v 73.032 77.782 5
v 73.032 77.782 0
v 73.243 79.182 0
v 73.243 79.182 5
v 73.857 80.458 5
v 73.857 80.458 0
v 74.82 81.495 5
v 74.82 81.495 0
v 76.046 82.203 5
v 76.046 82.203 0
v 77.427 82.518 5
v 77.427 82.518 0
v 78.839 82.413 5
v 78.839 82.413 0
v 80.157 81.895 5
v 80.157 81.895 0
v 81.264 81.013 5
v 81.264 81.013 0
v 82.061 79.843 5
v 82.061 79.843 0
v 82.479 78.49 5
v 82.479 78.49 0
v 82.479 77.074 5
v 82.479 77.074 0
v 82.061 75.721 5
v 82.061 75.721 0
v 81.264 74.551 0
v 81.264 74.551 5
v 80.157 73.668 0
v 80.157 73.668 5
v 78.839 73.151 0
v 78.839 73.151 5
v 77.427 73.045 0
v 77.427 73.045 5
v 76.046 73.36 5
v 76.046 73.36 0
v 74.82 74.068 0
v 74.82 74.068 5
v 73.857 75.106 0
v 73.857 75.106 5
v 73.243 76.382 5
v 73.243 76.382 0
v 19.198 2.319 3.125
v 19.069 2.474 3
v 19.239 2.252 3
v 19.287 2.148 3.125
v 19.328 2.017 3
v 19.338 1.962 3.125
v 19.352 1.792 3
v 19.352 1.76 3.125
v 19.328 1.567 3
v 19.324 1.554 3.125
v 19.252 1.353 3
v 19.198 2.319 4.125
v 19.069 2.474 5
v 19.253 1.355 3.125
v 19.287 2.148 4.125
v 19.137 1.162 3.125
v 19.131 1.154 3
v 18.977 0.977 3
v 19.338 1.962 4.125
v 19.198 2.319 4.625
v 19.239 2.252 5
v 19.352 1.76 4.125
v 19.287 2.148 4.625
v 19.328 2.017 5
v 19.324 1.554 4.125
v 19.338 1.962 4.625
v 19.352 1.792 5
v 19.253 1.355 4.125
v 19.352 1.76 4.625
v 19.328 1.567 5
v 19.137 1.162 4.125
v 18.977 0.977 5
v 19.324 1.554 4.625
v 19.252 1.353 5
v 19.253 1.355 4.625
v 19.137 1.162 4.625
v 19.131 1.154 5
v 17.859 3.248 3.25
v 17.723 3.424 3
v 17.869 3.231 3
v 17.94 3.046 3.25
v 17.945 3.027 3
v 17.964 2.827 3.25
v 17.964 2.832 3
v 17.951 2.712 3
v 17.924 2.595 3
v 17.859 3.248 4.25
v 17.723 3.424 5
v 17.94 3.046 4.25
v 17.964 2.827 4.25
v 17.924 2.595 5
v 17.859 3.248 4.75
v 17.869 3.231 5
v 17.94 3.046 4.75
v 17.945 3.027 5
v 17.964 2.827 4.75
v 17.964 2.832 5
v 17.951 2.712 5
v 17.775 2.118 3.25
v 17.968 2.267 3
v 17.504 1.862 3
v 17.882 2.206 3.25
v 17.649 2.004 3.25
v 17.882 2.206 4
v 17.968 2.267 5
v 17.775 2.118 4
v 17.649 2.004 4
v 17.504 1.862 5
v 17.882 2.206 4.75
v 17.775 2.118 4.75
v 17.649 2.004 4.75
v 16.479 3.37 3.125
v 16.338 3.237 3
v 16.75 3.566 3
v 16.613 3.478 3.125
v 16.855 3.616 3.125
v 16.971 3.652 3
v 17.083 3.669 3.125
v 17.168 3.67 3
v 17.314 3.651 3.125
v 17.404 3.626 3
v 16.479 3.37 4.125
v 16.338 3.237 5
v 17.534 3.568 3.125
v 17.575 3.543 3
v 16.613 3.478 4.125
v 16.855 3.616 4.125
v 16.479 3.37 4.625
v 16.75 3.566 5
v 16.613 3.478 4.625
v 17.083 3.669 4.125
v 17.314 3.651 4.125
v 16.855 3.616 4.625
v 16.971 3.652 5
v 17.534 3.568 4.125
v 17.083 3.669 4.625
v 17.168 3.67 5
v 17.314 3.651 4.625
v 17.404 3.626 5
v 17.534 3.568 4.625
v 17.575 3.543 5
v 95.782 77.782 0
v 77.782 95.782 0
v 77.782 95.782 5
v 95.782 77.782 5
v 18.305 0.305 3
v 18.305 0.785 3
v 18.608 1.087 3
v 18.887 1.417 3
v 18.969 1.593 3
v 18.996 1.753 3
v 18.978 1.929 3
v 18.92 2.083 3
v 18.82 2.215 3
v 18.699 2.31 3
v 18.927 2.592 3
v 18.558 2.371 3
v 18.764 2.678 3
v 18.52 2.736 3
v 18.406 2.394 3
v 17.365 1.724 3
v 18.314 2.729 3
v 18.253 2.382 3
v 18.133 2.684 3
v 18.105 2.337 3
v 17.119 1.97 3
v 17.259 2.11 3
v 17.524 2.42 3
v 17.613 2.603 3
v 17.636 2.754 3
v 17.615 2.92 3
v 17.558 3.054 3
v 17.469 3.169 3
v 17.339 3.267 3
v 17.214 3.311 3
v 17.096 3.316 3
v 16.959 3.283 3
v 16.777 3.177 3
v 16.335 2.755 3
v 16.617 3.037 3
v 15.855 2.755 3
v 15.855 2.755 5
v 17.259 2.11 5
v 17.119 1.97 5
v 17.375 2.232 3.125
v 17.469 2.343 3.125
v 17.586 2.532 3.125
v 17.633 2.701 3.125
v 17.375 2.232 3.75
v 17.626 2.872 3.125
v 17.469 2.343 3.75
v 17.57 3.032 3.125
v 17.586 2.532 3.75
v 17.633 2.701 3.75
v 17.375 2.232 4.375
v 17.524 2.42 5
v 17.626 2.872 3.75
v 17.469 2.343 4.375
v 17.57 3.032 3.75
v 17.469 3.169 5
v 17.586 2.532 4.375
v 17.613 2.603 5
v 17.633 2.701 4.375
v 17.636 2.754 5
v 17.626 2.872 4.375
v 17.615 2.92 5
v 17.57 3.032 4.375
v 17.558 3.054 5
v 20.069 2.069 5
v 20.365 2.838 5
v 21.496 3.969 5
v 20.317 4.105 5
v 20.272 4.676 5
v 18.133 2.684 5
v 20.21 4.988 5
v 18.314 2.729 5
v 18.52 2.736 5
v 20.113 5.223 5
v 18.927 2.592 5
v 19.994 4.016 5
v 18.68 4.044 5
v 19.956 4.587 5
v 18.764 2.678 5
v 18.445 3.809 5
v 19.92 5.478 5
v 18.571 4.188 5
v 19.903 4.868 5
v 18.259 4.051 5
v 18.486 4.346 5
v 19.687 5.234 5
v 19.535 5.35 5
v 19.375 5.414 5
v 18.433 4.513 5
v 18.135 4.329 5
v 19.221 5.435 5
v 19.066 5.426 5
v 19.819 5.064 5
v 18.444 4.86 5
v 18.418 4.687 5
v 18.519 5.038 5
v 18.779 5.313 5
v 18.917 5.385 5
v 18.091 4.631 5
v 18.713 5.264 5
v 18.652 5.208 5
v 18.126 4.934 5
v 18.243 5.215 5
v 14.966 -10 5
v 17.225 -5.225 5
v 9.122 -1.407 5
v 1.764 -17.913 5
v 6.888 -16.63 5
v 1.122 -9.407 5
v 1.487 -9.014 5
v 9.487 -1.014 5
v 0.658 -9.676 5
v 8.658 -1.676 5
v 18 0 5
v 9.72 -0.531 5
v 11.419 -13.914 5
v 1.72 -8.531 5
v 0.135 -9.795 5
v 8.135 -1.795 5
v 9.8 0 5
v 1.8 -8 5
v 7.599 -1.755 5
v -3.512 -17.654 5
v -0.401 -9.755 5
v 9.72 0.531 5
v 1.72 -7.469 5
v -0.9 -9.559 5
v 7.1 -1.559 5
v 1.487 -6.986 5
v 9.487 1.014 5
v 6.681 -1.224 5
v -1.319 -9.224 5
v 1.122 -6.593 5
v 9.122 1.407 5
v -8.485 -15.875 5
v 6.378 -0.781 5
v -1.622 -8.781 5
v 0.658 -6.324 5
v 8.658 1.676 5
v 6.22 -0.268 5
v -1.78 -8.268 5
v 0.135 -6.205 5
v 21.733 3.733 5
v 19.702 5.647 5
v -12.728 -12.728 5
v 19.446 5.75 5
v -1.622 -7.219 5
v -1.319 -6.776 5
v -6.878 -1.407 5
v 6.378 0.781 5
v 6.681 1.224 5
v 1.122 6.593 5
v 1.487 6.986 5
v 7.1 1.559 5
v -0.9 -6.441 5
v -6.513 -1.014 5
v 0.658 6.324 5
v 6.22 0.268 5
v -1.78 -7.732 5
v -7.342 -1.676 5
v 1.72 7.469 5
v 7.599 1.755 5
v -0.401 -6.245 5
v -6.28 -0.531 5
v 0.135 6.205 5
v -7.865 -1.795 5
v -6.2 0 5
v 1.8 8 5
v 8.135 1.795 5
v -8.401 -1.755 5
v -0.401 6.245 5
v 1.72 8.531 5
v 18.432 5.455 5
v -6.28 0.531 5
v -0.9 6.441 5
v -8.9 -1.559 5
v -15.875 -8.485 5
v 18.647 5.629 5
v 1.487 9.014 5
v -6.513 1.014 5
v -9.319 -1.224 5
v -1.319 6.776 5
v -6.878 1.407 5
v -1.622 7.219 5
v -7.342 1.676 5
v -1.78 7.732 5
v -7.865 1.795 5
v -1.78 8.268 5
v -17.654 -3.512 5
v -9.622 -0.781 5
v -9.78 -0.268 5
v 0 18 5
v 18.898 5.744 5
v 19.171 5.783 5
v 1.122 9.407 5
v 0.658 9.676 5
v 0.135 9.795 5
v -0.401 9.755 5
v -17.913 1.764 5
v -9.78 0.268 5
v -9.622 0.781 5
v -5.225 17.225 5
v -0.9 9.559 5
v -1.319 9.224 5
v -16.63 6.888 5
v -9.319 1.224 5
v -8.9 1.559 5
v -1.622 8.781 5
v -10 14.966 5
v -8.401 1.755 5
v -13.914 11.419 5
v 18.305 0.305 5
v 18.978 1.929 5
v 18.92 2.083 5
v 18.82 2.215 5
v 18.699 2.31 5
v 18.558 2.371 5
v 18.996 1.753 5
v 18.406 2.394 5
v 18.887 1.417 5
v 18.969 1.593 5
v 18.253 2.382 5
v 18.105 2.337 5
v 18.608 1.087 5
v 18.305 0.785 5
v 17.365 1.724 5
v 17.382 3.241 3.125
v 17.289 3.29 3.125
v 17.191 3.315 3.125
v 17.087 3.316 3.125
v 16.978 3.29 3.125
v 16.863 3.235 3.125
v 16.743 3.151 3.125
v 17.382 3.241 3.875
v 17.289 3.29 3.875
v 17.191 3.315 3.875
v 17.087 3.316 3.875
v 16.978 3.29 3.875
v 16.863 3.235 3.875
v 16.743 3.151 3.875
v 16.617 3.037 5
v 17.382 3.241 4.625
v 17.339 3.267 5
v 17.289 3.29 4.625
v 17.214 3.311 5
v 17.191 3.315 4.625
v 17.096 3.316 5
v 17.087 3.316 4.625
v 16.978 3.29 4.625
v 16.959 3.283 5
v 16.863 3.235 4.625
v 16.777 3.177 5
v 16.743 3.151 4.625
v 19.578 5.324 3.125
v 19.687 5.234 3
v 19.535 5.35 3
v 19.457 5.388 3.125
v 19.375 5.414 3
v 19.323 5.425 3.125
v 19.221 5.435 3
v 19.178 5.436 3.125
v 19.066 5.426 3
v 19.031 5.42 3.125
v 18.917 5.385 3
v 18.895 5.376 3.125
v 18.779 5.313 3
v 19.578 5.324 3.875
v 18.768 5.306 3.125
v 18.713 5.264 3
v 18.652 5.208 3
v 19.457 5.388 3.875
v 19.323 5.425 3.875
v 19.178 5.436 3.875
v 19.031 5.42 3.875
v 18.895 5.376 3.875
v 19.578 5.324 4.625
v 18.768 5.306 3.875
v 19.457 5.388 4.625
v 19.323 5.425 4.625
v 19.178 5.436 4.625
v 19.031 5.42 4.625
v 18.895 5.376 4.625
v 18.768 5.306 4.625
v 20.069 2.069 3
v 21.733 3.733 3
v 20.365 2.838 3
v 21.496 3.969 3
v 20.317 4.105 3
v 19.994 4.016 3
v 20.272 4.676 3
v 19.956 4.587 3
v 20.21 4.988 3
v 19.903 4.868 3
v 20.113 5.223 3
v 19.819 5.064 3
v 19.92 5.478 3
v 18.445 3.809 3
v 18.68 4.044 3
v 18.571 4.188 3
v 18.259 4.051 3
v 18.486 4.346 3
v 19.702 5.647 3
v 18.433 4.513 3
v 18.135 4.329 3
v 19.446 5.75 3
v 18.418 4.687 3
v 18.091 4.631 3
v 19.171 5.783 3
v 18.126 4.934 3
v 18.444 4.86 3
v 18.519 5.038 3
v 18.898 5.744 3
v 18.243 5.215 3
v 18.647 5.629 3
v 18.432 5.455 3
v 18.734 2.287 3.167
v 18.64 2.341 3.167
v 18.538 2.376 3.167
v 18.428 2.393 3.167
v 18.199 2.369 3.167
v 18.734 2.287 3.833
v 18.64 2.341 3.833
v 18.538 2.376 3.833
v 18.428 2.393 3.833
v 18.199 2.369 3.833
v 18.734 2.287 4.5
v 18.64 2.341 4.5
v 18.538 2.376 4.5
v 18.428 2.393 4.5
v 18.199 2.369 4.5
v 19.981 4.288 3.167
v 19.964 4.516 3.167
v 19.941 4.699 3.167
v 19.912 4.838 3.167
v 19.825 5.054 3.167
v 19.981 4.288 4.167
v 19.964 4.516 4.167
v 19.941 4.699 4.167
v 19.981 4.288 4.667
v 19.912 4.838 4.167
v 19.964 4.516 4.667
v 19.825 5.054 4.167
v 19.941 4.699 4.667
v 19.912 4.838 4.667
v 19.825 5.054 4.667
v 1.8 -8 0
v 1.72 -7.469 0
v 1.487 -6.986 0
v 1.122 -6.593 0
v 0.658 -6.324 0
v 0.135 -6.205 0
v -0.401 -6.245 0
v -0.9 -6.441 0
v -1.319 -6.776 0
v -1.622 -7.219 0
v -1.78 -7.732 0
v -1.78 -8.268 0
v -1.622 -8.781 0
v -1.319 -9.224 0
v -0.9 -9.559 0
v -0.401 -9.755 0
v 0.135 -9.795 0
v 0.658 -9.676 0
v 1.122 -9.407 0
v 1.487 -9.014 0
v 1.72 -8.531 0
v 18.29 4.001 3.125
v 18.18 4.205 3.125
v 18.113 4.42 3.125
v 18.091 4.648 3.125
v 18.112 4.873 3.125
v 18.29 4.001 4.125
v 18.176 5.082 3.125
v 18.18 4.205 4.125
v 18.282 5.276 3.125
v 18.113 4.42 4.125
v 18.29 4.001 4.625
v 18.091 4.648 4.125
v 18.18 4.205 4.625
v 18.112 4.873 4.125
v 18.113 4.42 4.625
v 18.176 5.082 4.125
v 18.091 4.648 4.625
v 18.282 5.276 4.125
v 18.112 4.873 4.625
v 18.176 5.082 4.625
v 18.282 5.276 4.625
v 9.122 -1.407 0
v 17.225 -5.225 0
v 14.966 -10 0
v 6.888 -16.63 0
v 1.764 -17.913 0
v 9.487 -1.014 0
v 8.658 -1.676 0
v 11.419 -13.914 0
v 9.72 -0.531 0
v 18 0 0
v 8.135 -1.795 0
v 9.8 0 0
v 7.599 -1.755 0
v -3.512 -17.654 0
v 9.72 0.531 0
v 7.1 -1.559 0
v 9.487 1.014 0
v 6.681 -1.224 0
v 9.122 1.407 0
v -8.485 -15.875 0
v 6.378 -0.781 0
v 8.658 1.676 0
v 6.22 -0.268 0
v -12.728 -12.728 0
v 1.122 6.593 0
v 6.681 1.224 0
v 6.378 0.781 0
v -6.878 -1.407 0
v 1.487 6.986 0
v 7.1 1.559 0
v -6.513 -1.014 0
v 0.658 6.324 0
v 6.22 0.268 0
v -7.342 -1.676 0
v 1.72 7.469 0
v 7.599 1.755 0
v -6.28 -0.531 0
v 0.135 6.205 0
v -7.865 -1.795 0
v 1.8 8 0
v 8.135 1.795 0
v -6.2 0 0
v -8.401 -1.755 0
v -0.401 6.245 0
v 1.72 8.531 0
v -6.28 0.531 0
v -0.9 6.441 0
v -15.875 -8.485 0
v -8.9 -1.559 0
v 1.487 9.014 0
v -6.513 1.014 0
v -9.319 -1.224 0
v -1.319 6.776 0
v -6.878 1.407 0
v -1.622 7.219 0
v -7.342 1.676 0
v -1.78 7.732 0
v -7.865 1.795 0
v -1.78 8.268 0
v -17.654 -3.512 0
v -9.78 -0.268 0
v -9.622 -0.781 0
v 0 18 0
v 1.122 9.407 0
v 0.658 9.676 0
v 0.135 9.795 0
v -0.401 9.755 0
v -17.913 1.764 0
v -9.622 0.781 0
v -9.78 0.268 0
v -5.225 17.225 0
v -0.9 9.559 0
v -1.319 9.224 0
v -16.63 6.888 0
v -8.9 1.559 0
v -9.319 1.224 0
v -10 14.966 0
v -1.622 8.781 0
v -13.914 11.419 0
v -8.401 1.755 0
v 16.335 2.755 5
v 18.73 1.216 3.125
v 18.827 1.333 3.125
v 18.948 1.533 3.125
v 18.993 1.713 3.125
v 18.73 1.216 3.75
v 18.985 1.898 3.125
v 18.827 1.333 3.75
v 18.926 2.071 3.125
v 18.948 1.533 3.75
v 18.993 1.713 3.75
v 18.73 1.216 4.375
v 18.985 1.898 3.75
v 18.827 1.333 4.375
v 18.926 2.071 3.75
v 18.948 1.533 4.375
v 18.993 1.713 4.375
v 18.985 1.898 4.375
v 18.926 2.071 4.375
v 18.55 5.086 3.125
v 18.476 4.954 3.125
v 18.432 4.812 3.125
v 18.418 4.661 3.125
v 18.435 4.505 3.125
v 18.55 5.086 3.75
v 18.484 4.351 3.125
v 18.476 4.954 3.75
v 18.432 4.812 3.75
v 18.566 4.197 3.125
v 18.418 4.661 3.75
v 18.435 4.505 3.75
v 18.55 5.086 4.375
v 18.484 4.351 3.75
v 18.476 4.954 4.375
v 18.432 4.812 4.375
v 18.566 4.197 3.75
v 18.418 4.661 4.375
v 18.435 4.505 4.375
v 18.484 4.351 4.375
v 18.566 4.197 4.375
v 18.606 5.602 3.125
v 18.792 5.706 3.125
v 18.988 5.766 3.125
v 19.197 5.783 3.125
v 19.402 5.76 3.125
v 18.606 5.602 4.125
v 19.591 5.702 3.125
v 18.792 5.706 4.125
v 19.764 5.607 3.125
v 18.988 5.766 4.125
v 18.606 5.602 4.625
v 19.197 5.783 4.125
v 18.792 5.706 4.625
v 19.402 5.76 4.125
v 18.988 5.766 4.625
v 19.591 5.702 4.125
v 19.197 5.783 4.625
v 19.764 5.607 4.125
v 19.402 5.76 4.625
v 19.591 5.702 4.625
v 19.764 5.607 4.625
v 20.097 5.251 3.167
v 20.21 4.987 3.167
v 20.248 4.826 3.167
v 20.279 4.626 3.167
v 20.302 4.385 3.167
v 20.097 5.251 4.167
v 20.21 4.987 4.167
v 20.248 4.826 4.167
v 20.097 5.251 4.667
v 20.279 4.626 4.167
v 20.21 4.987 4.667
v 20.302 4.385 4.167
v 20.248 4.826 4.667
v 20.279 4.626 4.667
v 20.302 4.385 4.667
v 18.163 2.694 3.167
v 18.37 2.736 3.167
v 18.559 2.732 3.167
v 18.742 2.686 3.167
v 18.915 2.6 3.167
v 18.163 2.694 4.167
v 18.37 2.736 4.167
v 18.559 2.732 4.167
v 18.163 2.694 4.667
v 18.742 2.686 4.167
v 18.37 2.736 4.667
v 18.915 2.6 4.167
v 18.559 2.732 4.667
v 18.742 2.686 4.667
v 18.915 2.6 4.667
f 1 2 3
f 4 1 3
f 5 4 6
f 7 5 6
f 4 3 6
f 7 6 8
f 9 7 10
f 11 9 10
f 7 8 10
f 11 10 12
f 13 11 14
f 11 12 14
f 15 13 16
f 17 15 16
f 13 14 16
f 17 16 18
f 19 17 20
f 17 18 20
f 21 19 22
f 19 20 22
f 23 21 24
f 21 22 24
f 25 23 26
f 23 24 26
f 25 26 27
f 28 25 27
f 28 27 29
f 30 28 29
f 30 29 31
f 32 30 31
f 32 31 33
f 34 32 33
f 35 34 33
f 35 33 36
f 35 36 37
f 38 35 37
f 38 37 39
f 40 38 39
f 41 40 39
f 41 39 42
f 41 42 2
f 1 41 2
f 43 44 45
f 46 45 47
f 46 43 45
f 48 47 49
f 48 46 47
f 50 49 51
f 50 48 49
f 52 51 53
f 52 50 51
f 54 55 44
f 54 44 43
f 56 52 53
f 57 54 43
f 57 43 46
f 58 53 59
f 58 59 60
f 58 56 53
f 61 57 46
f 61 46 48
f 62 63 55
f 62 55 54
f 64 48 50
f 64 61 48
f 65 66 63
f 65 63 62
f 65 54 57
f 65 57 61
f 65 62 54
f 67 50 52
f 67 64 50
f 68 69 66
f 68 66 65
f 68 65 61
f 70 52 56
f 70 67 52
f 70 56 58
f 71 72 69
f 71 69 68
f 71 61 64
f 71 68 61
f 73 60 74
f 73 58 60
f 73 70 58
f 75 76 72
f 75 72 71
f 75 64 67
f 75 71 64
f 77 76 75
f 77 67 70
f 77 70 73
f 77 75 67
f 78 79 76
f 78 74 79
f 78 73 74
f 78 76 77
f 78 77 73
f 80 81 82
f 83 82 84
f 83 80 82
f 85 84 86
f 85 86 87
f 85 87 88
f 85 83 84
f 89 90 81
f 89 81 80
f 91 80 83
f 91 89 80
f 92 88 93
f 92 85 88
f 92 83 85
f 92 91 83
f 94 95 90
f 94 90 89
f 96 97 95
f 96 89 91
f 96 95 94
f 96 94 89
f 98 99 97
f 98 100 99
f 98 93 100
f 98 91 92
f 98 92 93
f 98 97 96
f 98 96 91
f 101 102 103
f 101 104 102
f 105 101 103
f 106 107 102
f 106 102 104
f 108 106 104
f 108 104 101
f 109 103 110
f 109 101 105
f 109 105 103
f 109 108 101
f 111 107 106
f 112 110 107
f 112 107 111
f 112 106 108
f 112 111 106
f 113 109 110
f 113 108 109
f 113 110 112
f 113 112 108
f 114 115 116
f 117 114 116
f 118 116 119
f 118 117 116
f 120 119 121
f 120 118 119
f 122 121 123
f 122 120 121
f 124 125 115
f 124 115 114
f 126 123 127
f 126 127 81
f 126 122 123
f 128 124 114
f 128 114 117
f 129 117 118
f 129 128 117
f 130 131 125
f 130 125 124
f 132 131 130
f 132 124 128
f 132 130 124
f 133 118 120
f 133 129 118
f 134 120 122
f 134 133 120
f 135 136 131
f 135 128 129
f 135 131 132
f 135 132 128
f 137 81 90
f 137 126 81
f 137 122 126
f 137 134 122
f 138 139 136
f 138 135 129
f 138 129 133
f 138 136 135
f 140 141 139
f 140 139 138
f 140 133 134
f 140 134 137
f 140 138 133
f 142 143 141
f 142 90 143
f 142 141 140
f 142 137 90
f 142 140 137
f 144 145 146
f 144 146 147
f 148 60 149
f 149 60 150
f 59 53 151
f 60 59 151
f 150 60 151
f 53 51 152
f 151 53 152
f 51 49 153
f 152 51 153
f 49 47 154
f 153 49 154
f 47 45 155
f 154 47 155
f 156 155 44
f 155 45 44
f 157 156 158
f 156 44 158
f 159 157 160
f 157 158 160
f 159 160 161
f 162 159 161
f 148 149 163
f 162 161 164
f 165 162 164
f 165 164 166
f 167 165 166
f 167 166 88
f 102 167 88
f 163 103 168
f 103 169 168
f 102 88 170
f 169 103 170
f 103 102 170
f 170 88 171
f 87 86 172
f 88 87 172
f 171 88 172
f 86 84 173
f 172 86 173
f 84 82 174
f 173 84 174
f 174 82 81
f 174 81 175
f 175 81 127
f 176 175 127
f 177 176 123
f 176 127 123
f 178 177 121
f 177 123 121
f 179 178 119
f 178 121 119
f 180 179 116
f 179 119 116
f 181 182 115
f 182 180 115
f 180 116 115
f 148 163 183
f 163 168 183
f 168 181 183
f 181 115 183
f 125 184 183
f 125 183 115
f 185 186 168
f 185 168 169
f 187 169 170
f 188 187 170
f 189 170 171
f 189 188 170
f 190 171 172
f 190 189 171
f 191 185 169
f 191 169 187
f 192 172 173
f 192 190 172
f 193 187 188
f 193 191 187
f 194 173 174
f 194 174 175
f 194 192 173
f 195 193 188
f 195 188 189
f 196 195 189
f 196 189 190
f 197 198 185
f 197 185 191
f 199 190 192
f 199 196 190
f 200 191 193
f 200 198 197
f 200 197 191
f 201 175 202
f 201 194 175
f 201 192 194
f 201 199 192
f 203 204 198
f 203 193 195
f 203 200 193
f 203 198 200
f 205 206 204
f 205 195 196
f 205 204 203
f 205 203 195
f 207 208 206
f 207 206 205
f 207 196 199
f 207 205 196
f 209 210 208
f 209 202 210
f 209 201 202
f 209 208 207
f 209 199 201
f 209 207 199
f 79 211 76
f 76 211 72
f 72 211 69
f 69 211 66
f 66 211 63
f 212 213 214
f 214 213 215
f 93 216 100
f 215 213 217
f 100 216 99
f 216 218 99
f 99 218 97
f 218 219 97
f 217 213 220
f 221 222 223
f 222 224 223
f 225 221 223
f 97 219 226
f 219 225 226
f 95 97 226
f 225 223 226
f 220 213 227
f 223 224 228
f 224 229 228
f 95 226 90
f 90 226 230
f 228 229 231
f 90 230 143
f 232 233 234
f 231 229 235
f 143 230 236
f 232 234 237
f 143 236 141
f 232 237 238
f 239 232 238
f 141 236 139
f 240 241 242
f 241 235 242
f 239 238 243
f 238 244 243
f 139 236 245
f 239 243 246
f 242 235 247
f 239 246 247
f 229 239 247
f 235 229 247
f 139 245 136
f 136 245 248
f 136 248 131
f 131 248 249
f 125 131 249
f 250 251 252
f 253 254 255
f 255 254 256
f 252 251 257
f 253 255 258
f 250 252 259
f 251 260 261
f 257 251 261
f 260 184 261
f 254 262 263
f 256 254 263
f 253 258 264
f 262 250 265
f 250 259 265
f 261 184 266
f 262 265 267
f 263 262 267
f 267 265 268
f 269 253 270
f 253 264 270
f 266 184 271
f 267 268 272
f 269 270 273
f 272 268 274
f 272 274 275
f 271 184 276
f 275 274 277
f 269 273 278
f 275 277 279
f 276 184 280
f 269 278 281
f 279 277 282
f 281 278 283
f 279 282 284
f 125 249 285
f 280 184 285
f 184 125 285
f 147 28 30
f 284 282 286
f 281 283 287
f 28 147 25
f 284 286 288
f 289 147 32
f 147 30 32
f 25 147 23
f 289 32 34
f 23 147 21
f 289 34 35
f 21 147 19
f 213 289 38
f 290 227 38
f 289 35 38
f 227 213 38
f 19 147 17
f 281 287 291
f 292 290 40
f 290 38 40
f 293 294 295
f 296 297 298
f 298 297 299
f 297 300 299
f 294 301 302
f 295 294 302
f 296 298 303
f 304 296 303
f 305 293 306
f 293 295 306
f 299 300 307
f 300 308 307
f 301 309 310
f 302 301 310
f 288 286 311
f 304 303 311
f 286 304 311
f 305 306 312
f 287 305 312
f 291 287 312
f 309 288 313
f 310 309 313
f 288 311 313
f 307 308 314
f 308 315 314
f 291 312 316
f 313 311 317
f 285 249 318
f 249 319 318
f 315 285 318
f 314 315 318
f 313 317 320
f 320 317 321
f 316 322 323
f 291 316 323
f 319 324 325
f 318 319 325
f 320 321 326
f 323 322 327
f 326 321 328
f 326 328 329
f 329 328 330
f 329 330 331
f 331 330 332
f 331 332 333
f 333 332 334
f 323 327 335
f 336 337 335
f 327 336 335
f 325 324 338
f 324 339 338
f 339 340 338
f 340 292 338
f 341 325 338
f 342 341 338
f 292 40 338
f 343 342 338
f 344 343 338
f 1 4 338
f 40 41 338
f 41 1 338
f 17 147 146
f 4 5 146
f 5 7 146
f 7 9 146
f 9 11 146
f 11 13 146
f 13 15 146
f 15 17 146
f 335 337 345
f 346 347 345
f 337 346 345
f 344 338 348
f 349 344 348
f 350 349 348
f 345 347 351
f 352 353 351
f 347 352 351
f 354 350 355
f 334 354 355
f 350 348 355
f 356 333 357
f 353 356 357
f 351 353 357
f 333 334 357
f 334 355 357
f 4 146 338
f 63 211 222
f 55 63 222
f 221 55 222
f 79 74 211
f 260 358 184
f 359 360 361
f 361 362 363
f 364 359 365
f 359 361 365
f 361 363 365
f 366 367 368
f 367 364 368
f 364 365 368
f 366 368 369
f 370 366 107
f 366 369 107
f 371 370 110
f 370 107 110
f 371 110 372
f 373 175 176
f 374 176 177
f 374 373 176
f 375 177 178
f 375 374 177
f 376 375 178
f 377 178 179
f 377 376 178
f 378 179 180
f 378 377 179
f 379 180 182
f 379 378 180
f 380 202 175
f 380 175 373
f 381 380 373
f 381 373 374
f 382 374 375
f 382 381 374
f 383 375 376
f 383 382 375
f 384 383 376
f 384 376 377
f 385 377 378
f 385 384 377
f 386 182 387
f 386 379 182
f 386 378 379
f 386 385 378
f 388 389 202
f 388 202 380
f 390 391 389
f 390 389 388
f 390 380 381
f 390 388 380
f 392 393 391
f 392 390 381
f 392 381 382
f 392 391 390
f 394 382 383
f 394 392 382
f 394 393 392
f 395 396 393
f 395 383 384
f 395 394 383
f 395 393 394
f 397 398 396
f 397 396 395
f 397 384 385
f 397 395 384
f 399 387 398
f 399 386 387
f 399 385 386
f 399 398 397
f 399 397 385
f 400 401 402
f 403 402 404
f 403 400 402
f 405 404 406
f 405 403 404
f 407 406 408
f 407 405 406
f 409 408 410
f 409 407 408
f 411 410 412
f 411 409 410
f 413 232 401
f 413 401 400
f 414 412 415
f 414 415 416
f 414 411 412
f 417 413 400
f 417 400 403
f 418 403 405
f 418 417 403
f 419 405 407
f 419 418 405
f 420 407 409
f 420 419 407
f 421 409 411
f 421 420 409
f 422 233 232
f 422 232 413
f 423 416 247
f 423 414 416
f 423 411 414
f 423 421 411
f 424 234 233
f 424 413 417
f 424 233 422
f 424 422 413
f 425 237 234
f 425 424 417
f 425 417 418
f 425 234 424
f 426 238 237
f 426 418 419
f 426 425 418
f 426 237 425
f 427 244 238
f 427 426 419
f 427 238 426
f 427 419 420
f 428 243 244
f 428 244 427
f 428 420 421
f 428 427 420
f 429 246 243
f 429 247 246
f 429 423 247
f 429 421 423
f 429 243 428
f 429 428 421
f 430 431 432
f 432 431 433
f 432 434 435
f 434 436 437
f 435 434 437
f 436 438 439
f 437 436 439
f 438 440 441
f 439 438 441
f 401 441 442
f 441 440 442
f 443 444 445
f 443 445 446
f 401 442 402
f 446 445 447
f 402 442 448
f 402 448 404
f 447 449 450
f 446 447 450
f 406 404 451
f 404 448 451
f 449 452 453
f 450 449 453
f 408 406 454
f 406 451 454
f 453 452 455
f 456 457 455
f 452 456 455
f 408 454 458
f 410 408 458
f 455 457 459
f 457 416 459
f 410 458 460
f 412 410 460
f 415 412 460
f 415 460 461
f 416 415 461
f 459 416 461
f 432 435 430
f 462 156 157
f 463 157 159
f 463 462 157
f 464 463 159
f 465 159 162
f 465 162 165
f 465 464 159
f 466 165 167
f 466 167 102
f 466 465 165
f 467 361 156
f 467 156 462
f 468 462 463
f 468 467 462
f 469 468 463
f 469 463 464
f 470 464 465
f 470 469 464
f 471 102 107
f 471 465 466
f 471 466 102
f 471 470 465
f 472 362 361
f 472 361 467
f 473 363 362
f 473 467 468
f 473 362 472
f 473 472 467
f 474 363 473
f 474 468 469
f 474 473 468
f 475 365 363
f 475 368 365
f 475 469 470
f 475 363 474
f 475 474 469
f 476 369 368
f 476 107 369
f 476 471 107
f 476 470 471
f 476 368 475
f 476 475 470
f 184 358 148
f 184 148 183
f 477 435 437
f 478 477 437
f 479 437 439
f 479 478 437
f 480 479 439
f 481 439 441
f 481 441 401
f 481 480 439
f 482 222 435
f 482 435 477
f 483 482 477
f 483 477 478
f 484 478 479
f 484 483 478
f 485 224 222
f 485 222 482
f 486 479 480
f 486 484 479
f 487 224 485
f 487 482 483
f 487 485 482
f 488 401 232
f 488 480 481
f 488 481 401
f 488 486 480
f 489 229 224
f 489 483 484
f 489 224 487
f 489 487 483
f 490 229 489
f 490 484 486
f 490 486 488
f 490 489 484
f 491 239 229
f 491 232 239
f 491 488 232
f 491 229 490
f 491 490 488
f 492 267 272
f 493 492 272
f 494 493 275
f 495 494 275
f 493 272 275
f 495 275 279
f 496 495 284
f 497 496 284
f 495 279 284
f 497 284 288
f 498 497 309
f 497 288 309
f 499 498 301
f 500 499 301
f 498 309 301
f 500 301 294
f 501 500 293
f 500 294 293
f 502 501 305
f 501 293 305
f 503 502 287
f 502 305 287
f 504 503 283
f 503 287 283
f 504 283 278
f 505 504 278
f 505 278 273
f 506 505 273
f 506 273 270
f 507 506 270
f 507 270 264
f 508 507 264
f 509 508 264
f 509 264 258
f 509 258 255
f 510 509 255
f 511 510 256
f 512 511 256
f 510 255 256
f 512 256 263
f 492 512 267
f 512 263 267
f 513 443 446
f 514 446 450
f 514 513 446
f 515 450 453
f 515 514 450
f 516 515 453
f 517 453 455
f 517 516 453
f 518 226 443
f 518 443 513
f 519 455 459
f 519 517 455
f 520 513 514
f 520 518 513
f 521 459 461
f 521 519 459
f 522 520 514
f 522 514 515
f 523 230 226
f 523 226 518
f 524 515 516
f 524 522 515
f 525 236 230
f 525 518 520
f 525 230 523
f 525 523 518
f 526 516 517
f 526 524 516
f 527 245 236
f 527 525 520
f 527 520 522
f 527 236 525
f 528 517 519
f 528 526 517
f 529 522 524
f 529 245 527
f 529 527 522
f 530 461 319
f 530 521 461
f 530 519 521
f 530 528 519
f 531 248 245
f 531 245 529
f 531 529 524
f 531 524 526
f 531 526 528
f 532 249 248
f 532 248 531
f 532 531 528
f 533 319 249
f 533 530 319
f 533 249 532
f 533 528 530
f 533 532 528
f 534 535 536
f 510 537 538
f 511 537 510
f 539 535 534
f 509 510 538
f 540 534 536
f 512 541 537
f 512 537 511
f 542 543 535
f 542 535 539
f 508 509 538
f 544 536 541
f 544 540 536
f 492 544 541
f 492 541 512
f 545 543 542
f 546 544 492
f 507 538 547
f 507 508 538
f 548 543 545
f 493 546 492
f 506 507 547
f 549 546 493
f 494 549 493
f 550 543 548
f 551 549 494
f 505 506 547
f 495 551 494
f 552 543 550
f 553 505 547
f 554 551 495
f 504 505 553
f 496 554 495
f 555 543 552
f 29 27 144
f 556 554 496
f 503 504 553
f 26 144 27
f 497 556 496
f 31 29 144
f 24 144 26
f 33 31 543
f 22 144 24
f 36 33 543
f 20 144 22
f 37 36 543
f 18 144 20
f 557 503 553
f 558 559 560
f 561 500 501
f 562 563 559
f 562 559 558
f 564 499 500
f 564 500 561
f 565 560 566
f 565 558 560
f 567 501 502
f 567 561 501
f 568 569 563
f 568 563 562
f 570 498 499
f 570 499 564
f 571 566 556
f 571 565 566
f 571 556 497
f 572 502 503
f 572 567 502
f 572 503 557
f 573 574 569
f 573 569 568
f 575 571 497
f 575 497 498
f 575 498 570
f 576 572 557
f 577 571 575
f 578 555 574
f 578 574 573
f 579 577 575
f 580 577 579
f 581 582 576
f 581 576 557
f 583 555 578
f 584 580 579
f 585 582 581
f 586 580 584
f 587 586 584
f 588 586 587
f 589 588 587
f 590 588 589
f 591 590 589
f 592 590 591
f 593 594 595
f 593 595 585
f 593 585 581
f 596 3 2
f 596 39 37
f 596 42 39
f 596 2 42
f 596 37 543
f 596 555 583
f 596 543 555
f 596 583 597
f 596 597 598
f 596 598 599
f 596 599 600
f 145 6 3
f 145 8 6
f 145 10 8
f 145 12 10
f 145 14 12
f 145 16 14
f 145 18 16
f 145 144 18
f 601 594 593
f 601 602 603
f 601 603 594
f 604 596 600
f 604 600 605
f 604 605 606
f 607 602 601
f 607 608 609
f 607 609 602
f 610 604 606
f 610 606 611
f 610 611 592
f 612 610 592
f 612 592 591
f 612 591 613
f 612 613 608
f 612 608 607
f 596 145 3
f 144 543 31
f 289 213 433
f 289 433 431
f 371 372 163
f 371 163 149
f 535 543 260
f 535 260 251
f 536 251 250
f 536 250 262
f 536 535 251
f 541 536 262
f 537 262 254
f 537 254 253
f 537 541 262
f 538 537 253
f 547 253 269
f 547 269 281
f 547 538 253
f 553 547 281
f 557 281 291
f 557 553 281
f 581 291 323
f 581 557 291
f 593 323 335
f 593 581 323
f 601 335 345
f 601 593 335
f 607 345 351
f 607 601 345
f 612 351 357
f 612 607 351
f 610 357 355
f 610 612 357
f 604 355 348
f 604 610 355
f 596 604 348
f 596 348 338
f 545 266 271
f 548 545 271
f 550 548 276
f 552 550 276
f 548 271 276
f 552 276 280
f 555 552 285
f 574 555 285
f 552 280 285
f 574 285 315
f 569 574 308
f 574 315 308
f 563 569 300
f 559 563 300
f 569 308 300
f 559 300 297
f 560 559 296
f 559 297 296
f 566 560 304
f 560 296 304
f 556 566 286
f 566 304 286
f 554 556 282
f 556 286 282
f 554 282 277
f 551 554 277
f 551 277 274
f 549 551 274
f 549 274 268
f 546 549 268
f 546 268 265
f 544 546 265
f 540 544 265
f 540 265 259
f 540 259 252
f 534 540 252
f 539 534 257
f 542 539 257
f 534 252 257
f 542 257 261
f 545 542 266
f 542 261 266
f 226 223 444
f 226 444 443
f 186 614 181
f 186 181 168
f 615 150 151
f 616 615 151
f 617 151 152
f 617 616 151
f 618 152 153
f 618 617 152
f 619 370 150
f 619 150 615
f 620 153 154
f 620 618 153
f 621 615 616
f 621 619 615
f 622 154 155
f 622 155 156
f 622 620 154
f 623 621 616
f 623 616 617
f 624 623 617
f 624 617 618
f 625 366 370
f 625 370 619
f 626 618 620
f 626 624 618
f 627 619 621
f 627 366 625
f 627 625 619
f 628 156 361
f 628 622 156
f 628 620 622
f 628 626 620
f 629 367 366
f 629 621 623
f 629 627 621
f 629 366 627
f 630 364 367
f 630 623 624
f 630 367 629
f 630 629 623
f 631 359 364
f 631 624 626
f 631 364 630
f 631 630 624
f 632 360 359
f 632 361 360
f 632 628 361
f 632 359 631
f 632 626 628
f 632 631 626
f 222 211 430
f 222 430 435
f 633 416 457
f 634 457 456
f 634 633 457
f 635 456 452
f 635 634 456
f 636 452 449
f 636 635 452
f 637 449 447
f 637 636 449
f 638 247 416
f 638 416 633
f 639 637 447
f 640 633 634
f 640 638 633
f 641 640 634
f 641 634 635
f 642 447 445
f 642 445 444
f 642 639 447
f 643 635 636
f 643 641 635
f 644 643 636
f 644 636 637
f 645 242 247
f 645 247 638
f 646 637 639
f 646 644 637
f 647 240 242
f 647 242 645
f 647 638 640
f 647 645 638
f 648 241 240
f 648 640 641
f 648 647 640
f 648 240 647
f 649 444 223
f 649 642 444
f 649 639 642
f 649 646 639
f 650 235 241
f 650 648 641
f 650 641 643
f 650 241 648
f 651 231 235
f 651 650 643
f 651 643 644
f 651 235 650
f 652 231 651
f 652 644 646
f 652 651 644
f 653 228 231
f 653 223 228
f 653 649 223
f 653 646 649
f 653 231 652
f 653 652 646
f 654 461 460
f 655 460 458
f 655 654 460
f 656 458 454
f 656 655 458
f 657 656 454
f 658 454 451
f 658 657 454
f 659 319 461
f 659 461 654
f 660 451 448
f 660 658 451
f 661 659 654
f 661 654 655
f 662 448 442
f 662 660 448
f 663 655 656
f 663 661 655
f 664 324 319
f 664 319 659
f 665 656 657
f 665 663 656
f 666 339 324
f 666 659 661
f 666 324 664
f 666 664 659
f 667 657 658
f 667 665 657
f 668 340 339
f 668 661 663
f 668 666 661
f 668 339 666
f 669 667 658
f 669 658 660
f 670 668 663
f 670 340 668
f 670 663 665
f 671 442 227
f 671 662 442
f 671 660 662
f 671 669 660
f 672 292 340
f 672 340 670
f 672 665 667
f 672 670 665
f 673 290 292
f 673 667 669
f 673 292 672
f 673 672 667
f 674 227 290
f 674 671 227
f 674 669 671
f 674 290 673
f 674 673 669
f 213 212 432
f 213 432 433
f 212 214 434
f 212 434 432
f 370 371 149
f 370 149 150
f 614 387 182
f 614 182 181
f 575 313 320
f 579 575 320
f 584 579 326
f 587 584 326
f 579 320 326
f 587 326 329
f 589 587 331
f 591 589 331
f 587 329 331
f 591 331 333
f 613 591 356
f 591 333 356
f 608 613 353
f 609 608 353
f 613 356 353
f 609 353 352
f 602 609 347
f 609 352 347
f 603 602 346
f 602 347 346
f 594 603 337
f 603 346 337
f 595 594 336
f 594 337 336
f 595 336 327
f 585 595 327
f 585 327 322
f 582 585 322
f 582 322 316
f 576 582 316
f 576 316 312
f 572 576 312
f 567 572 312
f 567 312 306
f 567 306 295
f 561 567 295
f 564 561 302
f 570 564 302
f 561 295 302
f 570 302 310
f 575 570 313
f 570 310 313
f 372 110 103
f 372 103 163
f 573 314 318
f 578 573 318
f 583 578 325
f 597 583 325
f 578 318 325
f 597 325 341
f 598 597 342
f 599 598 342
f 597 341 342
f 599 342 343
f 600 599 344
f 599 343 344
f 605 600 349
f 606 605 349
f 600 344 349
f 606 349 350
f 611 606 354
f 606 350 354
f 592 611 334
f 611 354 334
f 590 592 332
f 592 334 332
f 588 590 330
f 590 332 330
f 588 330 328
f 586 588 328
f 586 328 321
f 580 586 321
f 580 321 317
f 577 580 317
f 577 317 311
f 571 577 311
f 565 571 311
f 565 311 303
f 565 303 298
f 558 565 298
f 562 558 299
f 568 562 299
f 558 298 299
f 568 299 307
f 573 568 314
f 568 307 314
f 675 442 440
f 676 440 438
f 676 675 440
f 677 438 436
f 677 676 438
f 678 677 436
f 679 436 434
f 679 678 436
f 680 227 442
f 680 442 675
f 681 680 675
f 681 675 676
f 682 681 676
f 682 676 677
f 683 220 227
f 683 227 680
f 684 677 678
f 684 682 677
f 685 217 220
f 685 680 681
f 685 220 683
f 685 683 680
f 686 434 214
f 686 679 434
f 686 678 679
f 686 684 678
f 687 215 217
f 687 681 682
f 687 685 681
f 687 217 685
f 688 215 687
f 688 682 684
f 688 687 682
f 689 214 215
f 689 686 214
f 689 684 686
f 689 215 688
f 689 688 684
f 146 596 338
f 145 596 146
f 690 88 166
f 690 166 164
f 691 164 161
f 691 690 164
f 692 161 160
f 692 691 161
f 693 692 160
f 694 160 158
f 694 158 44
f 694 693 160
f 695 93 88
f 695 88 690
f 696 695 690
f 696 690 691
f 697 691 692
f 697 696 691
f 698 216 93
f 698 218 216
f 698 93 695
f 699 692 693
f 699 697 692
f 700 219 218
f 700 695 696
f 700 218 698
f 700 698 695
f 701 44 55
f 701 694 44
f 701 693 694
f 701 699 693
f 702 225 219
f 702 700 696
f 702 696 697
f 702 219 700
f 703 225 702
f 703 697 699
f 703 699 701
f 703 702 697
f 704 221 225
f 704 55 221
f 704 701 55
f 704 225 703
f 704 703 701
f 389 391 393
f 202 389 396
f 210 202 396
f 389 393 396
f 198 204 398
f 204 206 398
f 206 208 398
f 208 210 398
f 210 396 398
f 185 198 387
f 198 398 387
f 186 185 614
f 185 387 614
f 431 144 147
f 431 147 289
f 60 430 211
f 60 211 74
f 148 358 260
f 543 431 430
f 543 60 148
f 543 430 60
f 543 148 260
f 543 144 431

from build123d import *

# Parameters (mm, degrees)
EXTRUDE_1_DEPTH     = 5
SKETCH_3_R          = 1.8
CUT_EXTRUDE_1_DEPTH = 5
SKETCH_17_R         = 4.75
CUT_EXTRUDE_3_DEPTH = 10
CUT_EXTRUDE_4_DEPTH = 2


with BuildPart() as part:
    # ｽｹｯﾁ2 → ﾎﾞｽ - 押し出し1 (new body)
    with BuildSketch(Plane.XY):
        with BuildLine():
            Line((0, 18), (77.781745931, 95.781745931))
            Line((77.781745931, 95.781745931), (95.781745931, 77.781745931))
            Line((95.781745931, 77.781745931), (18, 0))
            ThreePointArc((18, 0), (-12.727922061, -12.727922061), (0, 18))
        make_face()
    extrude(amount=EXTRUDE_1_DEPTH)

    # ｽｹｯﾁ3 → ｶｯﾄ - 押し出し1 (cut)
    with BuildSketch(Plane.XY.offset(5)):
        with Locations((8, 0)):
            Circle(SKETCH_3_R)
        with Locations((-8, 0)):
            Circle(SKETCH_3_R)
        with Locations((0, 8)):
            Circle(SKETCH_3_R)
        with Locations((0, -8)):
            Circle(SKETCH_3_R)
    extrude(amount=-CUT_EXTRUDE_1_DEPTH, mode=Mode.SUBTRACT)

    # ｽｹｯﾁ17 → ｶｯﾄ - 押し出し3 (cut)
    with BuildSketch(Plane(origin=(0, 0, 0), x_dir=(-1, 0, 0), z_dir=(0, 0, -1))):
        with Locations((-77.781745931, 77.781745931)):
            Circle(SKETCH_17_R)
    extrude(amount=-CUT_EXTRUDE_3_DEPTH, mode=Mode.SUBTRACT)

    # ｽｹｯﾁ19 → ｶｯﾄ - 押し出し4 (cut)
    # profile 1 of 2: a face of its own
    with BuildSketch(Plane.XY.offset(5)):
        with BuildLine():
            Line((15.855268429, 2.754707532), (16.337640224, 3.237079327))
            add(Edge.make_bspline(
                [(16.337640224, 3.237079327), (16.361636244, 3.260293397), (16.408218349, 3.305357545), (16.477274438, 3.369688106), (16.545469784, 3.426369048), (16.611269245, 3.476782595), (16.67453774, 3.521568948), (16.7361987, 3.559379809), (16.795825225, 3.591200716), (16.871872864, 3.624727999), (16.966969698, 3.653873017), (17.082479968, 3.672190677), (17.199066441, 3.670898236), (17.315110423, 3.653286605), (17.428379125, 3.620047404), (17.535289182, 3.570326931), (17.635068442, 3.505394709), (17.693419935, 3.451135959), (17.723056891, 3.423577724)],
                knots=[0, 0, 0, 0, 1.010039783, 1.960732594, 2.854180912, 3.691307208, 4.468005985, 5.197960132, 5.877927144, 6.511073573, 7.709718577, 8.875597696, 10.035092746, 11.221940952, 12.416492297, 13.593189445, 14.77757135, 16, 16, 16, 16], degree=3))
            add(Edge.make_bspline(
                [(17.723056891, 3.423577724), (17.748907222, 3.395988049), (17.799791951, 3.341679529), (17.86086192, 3.249034468), (17.909264362, 3.150974335), (17.943058942, 3.046588677), (17.961703364, 2.937773062), (17.966408423, 2.825238629), (17.953357726, 2.709867118), (17.933631581, 2.633681441), (17.923577724, 2.594851763)],
                knots=[0, 0, 0, 0, 1.009361854, 1.986864539, 2.953844043, 3.926119456, 4.909298338, 5.897350454, 6.928339162, 8, 8, 8, 8], degree=3))
            add(Edge.make_bspline(
                [(17.923577724, 2.594851763), (17.964691882, 2.614115345), (18.043041439, 2.65082516), (18.158995384, 2.694482079), (18.267164276, 2.722716641), (18.368266928, 2.738437175), (18.464712365, 2.740724318), (18.559105414, 2.734343145), (18.652074716, 2.715438953), (18.743271203, 2.687478622), (18.832032435, 2.649809029), (18.91600667, 2.600887503), (18.996554039, 2.543324189), (19.044720198, 2.497538819), (19.069210737, 2.474258814)],
                knots=[0, 0, 0, 0, 1.315874709, 2.507608225, 3.585498209, 4.551237979, 5.466196096, 6.376502642, 7.28791766, 8.209348528, 9.138022758, 10.075770395, 11.021607253, 12, 12, 12, 12], degree=3))
            add(Edge.make_bspline(
                [(19.069210737, 2.474258814), (19.092599473, 2.449440468), (19.138665609, 2.400558591), (19.198580808, 2.320813485), (19.248757659, 2.23696628), (19.288874035, 2.148973724), (19.319088088, 2.056988851), (19.340337711, 1.961420498), (19.35116162, 1.861779131), (19.353603595, 1.759420479), (19.344959283, 1.655856432), (19.326582306, 1.552865819), (19.294576433, 1.45235159), (19.254469783, 1.352640057), (19.20080809, 1.255845024), (19.137696991, 1.160117323), (19.062923216, 1.06637518), (19.006366272, 1.0075364), (18.977363782, 0.977363782)],
                knots=[0, 0, 0, 0, 0.973618807, 1.917626368, 2.842748053, 3.759934448, 4.674078596, 5.603861842, 6.551239227, 7.532836595, 8.524148287, 9.515392535, 10.514251514, 11.532117037, 12.580696629, 13.669460725, 14.804895817, 16, 16, 16, 16], degree=3))
            Line((18.977363782, 0.977363782), (18.304987981, 0.304987981))
            Line((18.304987981, 0.304987981), (15.855268429, 2.754707532))
        make_face()
        with BuildLine():
            Line((16.334835737, 2.754707532), (17.119391026, 1.970152244))
            Line((17.119391026, 1.970152244), (17.258914263, 2.109675481))
            add(Edge.make_bspline(
                [(17.258914263, 2.109675481), (17.279344867, 2.130379618), (17.318824587, 2.170387907), (17.374290472, 2.229756369), (17.423622628, 2.287023454), (17.46759557, 2.341089529), (17.505709798, 2.392568092), (17.538391302, 2.441009596), (17.564858174, 2.487055997), (17.59309413, 2.543941625), (17.61852077, 2.614305549), (17.634551731, 2.700009307), (17.638401776, 2.786264897), (17.628385667, 2.872059035), (17.606163371, 2.955255632), (17.571896096, 3.033288034), (17.527167166, 3.106177436), (17.488243893, 3.147939793), (17.468549679, 3.169070513)],
                knots=[0, 0, 0, 0, 1.139072835, 2.201123148, 3.180922261, 4.098564989, 4.929603435, 5.688574638, 6.38558588, 7.007733967, 8.174379991, 9.301625663, 10.40998766, 11.542977531, 12.670780372, 13.769197616, 14.871269156, 16, 16, 16, 16], degree=3))
            add(Edge.make_bspline(
                [(17.468549679, 3.169070513), (17.454575514, 3.182486455), (17.427337097, 3.208636784), (17.382583156, 3.241568237), (17.337070195, 3.26937696), (17.289599855, 3.290450484), (17.240941161, 3.305995855), (17.190869145, 3.316038947), (17.139270655, 3.319472649), (17.086335591, 3.316518886), (17.031949874, 3.307352849), (16.976158216, 3.290996189), (16.919247017, 3.26700645), (16.861553932, 3.234663866), (16.802018981, 3.196097992), (16.740847938, 3.150508239), (16.679193241, 3.096629559), (16.63849147, 3.057531664), (16.617387821, 3.037259615)],
                knots=[0, 0, 0, 0, 0.948557859, 1.848927212, 2.71724673, 3.558159299, 4.387760741, 5.216729262, 6.05490664, 6.915255925, 7.809776763, 8.752297874, 9.758582881, 10.830042875, 11.989777664, 13.233797524, 14.565738862, 16, 16, 16, 16], degree=3))
            Line((16.617387821, 3.037259615), (16.334835737, 2.754707532))
        make_face(mode=Mode.SUBTRACT)
        with BuildLine():
            Line((17.365484776, 1.724058494), (18.304987981, 0.784555288))
            Line((18.304987981, 0.784555288), (18.607872596, 1.087439904))
            add(Edge.make_bspline(
                [(18.607872596, 1.087439904), (18.629275206, 1.109044591), (18.670816198, 1.150977801), (18.728580676, 1.213637686), (18.78040811, 1.273630721), (18.825520515, 1.331067172), (18.866079219, 1.384610685), (18.899201172, 1.436380235), (18.926601353, 1.484976682), (18.954768318, 1.545783007), (18.979194131, 1.621060865), (18.995742258, 1.712595152), (18.998646701, 1.805475959), (18.987264732, 1.898018549), (18.963346012, 1.987540592), (18.928834252, 2.071841306), (18.880150283, 2.14816153), (18.83991129, 2.192483861), (18.819611378, 2.21484375)],
                knots=[0, 0, 0, 0, 1.124283346, 2.182156578, 3.150297016, 4.054434607, 4.882226797, 5.63242387, 6.324810436, 6.943388099, 8.107411426, 9.239635659, 10.372090665, 11.529585415, 12.673943896, 13.789259634, 14.884717733, 16, 16, 16, 16], degree=3))
            add(Edge.make_bspline(
                [(18.819611378, 2.21484375), (18.805806454, 2.227944224), (18.778702867, 2.253664746), (18.734584284, 2.287729298), (18.688545814, 2.316959056), (18.640393723, 2.34210168), (18.589844066, 2.361232353), (18.537722466, 2.377153327), (18.48338692, 2.387336794), (18.408586834, 2.395986172), (18.312331465, 2.394051135), (18.196455649, 2.371495813), (18.0799591, 2.329788664), (18.006450681, 2.288217522), (17.968449519, 2.266726763)],
                knots=[0, 0, 0, 0, 0.741244022, 1.455304822, 2.167737733, 2.864218412, 3.56774849, 4.270806875, 4.985216026, 5.718360007, 7.203028222, 8.714052242, 10.301285311, 12, 12, 12, 12], degree=3))
            add(Edge.make_bspline(
                [(17.968449519, 2.266726763), (17.954546976, 2.257775345), (17.924760951, 2.238597044), (17.879294179, 2.204076146), (17.827704, 2.164687202), (17.772886789, 2.116183819), (17.711833805, 2.062785945), (17.646541649, 2.002059991), (17.576390559, 1.934775072), (17.528528915, 1.887037845), (17.503605769, 1.862179487)],
                knots=[0, 0, 0, 0, 0.642612026, 1.376788289, 2.218319108, 3.165410458, 4.221040441, 5.371965022, 6.631494974, 8, 8, 8, 8], degree=3))
            Line((17.503605769, 1.862179487), (17.365484776, 1.724058494))
        make_face(mode=Mode.SUBTRACT)
    # profile 2 of 2: a face of its own
    with BuildSketch(Plane.XY.offset(5)):
        with BuildLine():
            Line((18.679947712, 4.043930084), (18.44507191, 3.809054282))
            add(Edge.make_bspline(
                [(18.44507191, 3.809054282), (18.416983932, 3.840170168), (18.361794655, 3.901308896), (18.289058706, 3.998984644), (18.228914661, 4.100448905), (18.178478634, 4.204177565), (18.138903344, 4.310656829), (18.111651343, 4.420543131), (18.094547862, 4.532976572), (18.08939992, 4.647347725), (18.093832951, 4.761245325), (18.110110402, 4.872329147), (18.13687007, 4.97967582), (18.174154567, 5.083059235), (18.22195057, 5.182683742), (18.281669605, 5.277557742), (18.351059086, 5.369391845), (18.40454396, 5.425861966), (18.431750596, 5.454587135)],
                knots=[0, 0, 0, 0, 1.097080493, 2.155622548, 3.181877021, 4.180734131, 5.171877943, 6.149826956, 7.139761318, 8.144411119, 9.14266836, 10.119602376, 11.078258423, 12.0343727, 12.992188754, 13.965052194, 14.964864601, 16, 16, 16, 16], degree=3))
            add(Edge.make_bspline(
                [(18.431750596, 5.454587135), (18.459728021, 5.481612676), (18.514591686, 5.534609697), (18.60439323, 5.60211944), (18.69571669, 5.660794713), (18.790830929, 5.706755278), (18.888070431, 5.743267195), (18.988603955, 5.767688853), (19.091741846, 5.781938676), (19.196790844, 5.784293399), (19.300677998, 5.777248543), (19.401891161, 5.761999775), (19.498923643, 5.737464105), (19.591941986, 5.703655765), (19.68082881, 5.660760647), (19.76507071, 5.608128396), (19.846475316, 5.54838448), (19.895482733, 5.501434536), (19.920232167, 5.477724154)],
                knots=[0, 0, 0, 0, 1.122280858, 2.200790098, 3.238096709, 4.252246287, 5.245154776, 6.232174131, 7.233396592, 8.24608549, 9.260661639, 10.237102996, 11.197933074, 12.145853668, 13.090621777, 14.04209139, 15.011228647, 16, 16, 16, 16], degree=3))
            add(Edge.make_bspline(
                [(19.920232167, 5.477724154), (19.953205475, 5.442293204), (20.018629785, 5.371992539), (20.09966903, 5.252732607), (20.164376509, 5.124122072), (20.205880126, 5.008848802), (20.231239822, 4.908550418), (20.249715247, 4.823271807), (20.265524198, 4.728013737), (20.27929129, 4.62250671), (20.291933535, 4.50728391), (20.302380902, 4.381974197), (20.310575865, 4.246840451), (20.314853989, 4.153311221), (20.317067103, 4.10492768)],
                knots=[0, 0, 0, 0, 1.186965879, 2.35512989, 3.525250991, 4.714032238, 5.354204103, 6.064327219, 6.855751055, 7.724040526, 8.676397383, 9.701349061, 10.810886467, 12, 12, 12, 12], degree=3))
            Line((20.317067103, 4.10492768), (20.365444507, 2.838000596))
            Line((20.365444507, 2.838000596), (21.496353962, 3.968910052))
            Line((21.496353962, 3.968910052), (21.732632007, 3.732632007))
            Line((21.732632007, 3.732632007), (20.068869987, 2.068869987))
            Line((20.068869987, 2.068869987), (19.993849955, 4.015885212))
            add(Edge.make_bspline(
                [(19.993849955, 4.015885212), (19.992113109, 4.063099402), (19.988775932, 4.153816727), (19.981845913, 4.284484443), (19.973222076, 4.403884114), (19.964749579, 4.512454961), (19.953128947, 4.609375237), (19.941882849, 4.695597448), (19.927639247, 4.770335397), (19.908750093, 4.854933545), (19.877317194, 4.949767602), (19.827335645, 5.054202323), (19.764954117, 5.150376664), (19.713321857, 5.205915084), (19.687459731, 5.233733769)],
                knots=[0, 0, 0, 0, 1.321003384, 2.538175354, 3.658322522, 4.668214357, 5.582507175, 6.387418368, 7.098718825, 7.708986377, 8.810374049, 9.883007488, 10.939617852, 12, 12, 12, 12], degree=3))
            add(Edge.make_bspline(
                [(19.687459731, 5.233733769), (19.669993805, 5.250195408), (19.635512833, 5.282693731), (19.579110355, 5.32516917), (19.519249107, 5.359894834), (19.457130299, 5.389422476), (19.391320896, 5.410894414), (19.322801968, 5.426477708), (19.251121754, 5.434623306), (19.177676874, 5.436898115), (19.103780198, 5.431783075), (19.031391478, 5.420882725), (18.961557848, 5.402606679), (18.894606417, 5.376927439), (18.829634922, 5.345354485), (18.767177019, 5.306599591), (18.707107661, 5.260982346), (18.670494509, 5.225705416), (18.65190284, 5.207792263)],
                knots=[0, 0, 0, 0, 0.999378411, 1.972958028, 2.933057605, 3.878232445, 4.832638458, 5.810492443, 6.800723905, 7.833131529, 8.867373731, 9.88218747, 10.878716478, 11.867798623, 12.864898163, 13.883487664, 14.925263348, 16, 16, 16, 16], degree=3))
            add(Edge.make_bspline(
                [(18.65190284, 5.207792263), (18.633288777, 5.188264155), (18.596602814, 5.149776725), (18.548879607, 5.08691605), (18.50826778, 5.021920064), (18.474454696, 4.954532973), (18.449713127, 4.884407267), (18.431128961, 4.812177099), (18.419803995, 4.73748939), (18.416517719, 4.660670549), (18.42048704, 4.582633329), (18.43343244, 4.504709893), (18.453826133, 4.426921553), (18.482851391, 4.349475495), (18.520438561, 4.272340617), (18.565261079, 4.194965979), (18.618937995, 4.118389312), (18.659286015, 4.069146624), (18.679947712, 4.043930084)],
                knots=[0, 0, 0, 0, 0.998669208, 1.968250618, 2.917050639, 3.834571943, 4.754621645, 5.665832379, 6.593829771, 7.547042473, 8.50933136, 9.482769513, 10.467535104, 11.483758791, 12.540754452, 13.64242777, 14.792717932, 16, 16, 16, 16], degree=3))
        make_face()
    extrude(amount=-CUT_EXTRUDE_4_DEPTH, mode=Mode.SUBTRACT)


solid = part.part
